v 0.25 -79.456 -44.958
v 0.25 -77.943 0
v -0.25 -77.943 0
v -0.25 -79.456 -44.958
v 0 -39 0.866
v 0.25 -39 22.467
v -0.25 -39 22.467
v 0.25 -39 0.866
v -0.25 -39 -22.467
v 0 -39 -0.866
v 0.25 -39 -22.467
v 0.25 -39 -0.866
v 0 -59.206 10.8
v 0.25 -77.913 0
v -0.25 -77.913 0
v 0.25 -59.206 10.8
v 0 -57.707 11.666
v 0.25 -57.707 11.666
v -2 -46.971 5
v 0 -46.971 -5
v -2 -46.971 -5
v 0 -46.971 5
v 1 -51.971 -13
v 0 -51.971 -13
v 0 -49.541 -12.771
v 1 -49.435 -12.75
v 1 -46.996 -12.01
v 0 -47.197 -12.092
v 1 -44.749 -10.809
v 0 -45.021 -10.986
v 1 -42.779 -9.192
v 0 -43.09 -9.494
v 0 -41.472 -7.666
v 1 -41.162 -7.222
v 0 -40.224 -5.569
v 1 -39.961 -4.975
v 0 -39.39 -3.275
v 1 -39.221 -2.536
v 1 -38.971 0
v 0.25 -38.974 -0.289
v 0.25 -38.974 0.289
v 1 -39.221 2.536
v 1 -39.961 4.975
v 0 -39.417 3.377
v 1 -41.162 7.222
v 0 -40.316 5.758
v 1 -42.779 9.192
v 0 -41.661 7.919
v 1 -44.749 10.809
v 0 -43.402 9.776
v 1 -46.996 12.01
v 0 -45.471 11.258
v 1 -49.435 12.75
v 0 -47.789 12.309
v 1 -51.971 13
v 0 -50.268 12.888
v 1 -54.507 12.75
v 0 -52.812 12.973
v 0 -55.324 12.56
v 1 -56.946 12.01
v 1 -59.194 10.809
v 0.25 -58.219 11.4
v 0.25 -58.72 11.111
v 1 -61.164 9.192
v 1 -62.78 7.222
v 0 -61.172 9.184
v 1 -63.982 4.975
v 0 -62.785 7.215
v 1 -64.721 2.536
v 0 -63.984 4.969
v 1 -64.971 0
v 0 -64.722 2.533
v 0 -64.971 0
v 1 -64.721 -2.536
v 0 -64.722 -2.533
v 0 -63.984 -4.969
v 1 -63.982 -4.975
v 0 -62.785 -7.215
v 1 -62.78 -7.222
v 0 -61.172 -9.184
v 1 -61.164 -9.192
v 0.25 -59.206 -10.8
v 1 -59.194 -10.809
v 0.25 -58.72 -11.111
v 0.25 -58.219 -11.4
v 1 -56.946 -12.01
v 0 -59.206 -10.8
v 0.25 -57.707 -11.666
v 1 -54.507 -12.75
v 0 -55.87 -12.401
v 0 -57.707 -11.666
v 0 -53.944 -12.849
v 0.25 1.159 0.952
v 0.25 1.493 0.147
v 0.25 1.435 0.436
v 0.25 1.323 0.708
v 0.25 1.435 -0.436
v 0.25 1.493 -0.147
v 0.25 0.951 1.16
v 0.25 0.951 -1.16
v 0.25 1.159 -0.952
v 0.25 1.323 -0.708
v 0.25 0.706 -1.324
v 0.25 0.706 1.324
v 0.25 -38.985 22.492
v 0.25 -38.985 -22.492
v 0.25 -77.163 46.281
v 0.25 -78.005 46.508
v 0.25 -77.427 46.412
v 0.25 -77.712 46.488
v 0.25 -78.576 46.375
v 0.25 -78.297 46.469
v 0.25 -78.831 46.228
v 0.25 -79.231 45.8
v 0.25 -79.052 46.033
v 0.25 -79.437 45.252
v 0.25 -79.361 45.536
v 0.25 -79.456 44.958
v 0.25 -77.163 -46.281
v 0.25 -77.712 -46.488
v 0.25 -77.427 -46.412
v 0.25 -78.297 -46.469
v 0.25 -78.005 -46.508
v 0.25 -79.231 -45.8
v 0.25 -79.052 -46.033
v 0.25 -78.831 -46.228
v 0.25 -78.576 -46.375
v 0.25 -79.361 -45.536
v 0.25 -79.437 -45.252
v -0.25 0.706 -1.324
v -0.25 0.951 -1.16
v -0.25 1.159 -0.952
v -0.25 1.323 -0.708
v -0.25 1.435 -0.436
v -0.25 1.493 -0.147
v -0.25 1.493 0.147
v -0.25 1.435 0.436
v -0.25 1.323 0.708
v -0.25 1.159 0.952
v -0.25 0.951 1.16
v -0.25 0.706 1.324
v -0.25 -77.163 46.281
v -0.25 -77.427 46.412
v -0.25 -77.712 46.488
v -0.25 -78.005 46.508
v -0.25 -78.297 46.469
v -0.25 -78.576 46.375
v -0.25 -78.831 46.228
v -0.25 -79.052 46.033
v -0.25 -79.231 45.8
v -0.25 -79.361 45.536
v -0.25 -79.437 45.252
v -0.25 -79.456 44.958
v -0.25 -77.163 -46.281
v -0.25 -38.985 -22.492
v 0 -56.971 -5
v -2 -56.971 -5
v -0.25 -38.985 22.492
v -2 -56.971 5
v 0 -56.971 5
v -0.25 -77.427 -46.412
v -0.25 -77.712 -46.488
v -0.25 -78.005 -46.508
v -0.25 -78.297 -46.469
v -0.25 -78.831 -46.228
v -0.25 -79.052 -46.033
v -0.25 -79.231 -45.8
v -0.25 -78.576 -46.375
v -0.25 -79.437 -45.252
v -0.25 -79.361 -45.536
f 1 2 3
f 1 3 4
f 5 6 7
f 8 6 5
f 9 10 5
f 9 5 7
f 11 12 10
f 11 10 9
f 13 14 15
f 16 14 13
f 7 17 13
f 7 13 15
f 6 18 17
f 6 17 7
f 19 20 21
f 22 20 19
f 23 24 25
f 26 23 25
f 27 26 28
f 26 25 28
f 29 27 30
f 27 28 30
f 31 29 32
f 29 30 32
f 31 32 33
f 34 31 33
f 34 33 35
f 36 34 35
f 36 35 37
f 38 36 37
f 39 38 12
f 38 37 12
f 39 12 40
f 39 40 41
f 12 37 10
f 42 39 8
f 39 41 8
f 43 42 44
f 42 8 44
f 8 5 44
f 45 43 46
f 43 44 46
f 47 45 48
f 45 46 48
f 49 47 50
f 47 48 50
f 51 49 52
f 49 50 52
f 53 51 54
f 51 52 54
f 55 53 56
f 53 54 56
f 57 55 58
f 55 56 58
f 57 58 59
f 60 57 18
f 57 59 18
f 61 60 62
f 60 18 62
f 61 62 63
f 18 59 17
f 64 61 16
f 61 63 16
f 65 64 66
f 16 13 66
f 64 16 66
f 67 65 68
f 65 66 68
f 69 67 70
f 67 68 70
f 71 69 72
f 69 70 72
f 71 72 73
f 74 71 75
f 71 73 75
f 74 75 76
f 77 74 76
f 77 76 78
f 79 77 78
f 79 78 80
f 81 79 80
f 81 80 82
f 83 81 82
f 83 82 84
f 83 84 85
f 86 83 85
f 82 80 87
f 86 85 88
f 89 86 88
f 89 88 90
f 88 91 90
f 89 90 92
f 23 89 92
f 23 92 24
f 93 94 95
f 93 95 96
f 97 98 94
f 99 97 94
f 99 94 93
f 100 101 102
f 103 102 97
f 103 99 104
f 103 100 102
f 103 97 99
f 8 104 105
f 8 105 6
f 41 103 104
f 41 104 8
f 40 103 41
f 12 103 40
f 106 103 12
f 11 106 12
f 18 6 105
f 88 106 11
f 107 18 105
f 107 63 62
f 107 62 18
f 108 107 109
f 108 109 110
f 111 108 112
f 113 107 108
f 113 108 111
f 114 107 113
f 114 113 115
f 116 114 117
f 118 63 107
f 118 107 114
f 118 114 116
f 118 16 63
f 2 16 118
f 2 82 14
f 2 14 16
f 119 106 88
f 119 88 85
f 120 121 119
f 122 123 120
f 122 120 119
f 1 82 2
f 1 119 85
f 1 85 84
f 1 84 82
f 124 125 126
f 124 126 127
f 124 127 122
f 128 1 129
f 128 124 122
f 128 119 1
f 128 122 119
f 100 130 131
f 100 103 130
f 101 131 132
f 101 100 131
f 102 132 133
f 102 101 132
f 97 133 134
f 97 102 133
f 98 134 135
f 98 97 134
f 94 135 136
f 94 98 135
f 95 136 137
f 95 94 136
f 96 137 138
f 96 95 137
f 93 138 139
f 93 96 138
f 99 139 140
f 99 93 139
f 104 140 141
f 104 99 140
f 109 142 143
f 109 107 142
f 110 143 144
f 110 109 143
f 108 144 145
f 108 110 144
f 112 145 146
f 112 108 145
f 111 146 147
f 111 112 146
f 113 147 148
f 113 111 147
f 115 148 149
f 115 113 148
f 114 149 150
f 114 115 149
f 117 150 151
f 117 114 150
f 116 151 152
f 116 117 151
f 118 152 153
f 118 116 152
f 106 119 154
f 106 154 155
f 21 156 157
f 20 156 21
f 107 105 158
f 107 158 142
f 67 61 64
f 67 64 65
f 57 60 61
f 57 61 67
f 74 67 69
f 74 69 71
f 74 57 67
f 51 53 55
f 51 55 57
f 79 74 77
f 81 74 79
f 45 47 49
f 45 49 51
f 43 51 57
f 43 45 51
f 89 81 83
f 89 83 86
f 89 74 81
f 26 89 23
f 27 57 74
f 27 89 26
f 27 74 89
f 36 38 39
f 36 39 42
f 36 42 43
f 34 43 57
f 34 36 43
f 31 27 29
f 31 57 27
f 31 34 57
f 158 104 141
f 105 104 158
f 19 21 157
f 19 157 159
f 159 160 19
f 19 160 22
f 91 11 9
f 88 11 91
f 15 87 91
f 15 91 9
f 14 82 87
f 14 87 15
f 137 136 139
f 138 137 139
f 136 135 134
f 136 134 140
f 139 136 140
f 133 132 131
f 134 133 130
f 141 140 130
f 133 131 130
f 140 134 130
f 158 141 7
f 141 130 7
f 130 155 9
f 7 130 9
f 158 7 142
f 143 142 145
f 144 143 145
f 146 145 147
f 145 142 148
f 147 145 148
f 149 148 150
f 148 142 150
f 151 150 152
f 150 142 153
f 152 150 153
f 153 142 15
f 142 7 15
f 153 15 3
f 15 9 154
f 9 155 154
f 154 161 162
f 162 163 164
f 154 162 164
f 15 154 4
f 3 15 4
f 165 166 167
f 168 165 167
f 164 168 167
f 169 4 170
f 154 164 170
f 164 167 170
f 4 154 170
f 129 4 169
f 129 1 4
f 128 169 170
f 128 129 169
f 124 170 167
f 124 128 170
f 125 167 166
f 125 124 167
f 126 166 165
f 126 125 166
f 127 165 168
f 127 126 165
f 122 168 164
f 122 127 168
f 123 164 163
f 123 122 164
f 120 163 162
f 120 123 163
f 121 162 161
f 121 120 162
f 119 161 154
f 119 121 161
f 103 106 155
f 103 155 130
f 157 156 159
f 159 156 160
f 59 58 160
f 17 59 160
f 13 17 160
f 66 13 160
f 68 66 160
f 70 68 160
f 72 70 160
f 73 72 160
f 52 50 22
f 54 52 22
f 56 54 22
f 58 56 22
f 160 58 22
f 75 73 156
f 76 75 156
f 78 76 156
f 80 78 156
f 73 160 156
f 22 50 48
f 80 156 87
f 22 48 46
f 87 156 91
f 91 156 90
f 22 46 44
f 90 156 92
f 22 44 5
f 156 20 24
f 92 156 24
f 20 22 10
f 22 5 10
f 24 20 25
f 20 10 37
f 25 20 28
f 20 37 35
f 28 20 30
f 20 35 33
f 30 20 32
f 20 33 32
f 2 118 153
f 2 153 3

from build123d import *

# Parameters (mm, degrees)
BOSS_EXTRUDE1_DEPTH = 0.25
SKETCH2_R           = 13
BOSS_EXTRUDE2_DEPTH = 1
CIRPATTERN1_COUNT   = 3
SKETCH4_W           = 10
SKETCH4_H           = 10
BOSS_EXTRUDE3_DEPTH = 2


with BuildPart() as part:
    # Sketch1 → Boss-Extrude1 (new body, symmetric)
    with BuildSketch(Plane(origin=(0, 0, 0), x_dir=(0, 0, -1), z_dir=(1, 0, 0))):
        with BuildLine():
            Line((-1.323529412, 0.705882353), (-22.5, -39))
            Line((-22.5, -39), (22.5, -39))
            Line((22.5, -39), (1.323529412, 0.705882353))
            ThreePointArc((1.323529412, 0.705882353), (0, 1.5), (-1.323529412, 0.705882353))
        make_face()
    boss_extrude1 = extrude(amount=BOSS_EXTRUDE1_DEPTH, both=True)

    # Sketch2 → Boss-Extrude2 (add)
    with BuildSketch(Plane(origin=(0, 0, 0), x_dir=(0, 0, -1), z_dir=(1, 0, 0))):
        with Locations((0, -51.97114317)):
            Circle(SKETCH2_R)
    extrude(amount=BOSS_EXTRUDE2_DEPTH)

    # CirPattern1: Boss-Extrude1 ×3 about axis
    cirpattern1_axis = Axis((0, -51.97114317, 0), (1, 0, 0))
    for i in range(1, CIRPATTERN1_COUNT):
        add(boss_extrude1.rotate(cirpattern1_axis, i * 360 / CIRPATTERN1_COUNT))

    # Sketch4 → Boss-Extrude3 (add)
    with BuildSketch(Plane.ZY):
        with Locations((0, -51.97114317)):
            Rectangle(SKETCH4_W, SKETCH4_H)
    extrude(amount=BOSS_EXTRUDE3_DEPTH)


solid = part.part
